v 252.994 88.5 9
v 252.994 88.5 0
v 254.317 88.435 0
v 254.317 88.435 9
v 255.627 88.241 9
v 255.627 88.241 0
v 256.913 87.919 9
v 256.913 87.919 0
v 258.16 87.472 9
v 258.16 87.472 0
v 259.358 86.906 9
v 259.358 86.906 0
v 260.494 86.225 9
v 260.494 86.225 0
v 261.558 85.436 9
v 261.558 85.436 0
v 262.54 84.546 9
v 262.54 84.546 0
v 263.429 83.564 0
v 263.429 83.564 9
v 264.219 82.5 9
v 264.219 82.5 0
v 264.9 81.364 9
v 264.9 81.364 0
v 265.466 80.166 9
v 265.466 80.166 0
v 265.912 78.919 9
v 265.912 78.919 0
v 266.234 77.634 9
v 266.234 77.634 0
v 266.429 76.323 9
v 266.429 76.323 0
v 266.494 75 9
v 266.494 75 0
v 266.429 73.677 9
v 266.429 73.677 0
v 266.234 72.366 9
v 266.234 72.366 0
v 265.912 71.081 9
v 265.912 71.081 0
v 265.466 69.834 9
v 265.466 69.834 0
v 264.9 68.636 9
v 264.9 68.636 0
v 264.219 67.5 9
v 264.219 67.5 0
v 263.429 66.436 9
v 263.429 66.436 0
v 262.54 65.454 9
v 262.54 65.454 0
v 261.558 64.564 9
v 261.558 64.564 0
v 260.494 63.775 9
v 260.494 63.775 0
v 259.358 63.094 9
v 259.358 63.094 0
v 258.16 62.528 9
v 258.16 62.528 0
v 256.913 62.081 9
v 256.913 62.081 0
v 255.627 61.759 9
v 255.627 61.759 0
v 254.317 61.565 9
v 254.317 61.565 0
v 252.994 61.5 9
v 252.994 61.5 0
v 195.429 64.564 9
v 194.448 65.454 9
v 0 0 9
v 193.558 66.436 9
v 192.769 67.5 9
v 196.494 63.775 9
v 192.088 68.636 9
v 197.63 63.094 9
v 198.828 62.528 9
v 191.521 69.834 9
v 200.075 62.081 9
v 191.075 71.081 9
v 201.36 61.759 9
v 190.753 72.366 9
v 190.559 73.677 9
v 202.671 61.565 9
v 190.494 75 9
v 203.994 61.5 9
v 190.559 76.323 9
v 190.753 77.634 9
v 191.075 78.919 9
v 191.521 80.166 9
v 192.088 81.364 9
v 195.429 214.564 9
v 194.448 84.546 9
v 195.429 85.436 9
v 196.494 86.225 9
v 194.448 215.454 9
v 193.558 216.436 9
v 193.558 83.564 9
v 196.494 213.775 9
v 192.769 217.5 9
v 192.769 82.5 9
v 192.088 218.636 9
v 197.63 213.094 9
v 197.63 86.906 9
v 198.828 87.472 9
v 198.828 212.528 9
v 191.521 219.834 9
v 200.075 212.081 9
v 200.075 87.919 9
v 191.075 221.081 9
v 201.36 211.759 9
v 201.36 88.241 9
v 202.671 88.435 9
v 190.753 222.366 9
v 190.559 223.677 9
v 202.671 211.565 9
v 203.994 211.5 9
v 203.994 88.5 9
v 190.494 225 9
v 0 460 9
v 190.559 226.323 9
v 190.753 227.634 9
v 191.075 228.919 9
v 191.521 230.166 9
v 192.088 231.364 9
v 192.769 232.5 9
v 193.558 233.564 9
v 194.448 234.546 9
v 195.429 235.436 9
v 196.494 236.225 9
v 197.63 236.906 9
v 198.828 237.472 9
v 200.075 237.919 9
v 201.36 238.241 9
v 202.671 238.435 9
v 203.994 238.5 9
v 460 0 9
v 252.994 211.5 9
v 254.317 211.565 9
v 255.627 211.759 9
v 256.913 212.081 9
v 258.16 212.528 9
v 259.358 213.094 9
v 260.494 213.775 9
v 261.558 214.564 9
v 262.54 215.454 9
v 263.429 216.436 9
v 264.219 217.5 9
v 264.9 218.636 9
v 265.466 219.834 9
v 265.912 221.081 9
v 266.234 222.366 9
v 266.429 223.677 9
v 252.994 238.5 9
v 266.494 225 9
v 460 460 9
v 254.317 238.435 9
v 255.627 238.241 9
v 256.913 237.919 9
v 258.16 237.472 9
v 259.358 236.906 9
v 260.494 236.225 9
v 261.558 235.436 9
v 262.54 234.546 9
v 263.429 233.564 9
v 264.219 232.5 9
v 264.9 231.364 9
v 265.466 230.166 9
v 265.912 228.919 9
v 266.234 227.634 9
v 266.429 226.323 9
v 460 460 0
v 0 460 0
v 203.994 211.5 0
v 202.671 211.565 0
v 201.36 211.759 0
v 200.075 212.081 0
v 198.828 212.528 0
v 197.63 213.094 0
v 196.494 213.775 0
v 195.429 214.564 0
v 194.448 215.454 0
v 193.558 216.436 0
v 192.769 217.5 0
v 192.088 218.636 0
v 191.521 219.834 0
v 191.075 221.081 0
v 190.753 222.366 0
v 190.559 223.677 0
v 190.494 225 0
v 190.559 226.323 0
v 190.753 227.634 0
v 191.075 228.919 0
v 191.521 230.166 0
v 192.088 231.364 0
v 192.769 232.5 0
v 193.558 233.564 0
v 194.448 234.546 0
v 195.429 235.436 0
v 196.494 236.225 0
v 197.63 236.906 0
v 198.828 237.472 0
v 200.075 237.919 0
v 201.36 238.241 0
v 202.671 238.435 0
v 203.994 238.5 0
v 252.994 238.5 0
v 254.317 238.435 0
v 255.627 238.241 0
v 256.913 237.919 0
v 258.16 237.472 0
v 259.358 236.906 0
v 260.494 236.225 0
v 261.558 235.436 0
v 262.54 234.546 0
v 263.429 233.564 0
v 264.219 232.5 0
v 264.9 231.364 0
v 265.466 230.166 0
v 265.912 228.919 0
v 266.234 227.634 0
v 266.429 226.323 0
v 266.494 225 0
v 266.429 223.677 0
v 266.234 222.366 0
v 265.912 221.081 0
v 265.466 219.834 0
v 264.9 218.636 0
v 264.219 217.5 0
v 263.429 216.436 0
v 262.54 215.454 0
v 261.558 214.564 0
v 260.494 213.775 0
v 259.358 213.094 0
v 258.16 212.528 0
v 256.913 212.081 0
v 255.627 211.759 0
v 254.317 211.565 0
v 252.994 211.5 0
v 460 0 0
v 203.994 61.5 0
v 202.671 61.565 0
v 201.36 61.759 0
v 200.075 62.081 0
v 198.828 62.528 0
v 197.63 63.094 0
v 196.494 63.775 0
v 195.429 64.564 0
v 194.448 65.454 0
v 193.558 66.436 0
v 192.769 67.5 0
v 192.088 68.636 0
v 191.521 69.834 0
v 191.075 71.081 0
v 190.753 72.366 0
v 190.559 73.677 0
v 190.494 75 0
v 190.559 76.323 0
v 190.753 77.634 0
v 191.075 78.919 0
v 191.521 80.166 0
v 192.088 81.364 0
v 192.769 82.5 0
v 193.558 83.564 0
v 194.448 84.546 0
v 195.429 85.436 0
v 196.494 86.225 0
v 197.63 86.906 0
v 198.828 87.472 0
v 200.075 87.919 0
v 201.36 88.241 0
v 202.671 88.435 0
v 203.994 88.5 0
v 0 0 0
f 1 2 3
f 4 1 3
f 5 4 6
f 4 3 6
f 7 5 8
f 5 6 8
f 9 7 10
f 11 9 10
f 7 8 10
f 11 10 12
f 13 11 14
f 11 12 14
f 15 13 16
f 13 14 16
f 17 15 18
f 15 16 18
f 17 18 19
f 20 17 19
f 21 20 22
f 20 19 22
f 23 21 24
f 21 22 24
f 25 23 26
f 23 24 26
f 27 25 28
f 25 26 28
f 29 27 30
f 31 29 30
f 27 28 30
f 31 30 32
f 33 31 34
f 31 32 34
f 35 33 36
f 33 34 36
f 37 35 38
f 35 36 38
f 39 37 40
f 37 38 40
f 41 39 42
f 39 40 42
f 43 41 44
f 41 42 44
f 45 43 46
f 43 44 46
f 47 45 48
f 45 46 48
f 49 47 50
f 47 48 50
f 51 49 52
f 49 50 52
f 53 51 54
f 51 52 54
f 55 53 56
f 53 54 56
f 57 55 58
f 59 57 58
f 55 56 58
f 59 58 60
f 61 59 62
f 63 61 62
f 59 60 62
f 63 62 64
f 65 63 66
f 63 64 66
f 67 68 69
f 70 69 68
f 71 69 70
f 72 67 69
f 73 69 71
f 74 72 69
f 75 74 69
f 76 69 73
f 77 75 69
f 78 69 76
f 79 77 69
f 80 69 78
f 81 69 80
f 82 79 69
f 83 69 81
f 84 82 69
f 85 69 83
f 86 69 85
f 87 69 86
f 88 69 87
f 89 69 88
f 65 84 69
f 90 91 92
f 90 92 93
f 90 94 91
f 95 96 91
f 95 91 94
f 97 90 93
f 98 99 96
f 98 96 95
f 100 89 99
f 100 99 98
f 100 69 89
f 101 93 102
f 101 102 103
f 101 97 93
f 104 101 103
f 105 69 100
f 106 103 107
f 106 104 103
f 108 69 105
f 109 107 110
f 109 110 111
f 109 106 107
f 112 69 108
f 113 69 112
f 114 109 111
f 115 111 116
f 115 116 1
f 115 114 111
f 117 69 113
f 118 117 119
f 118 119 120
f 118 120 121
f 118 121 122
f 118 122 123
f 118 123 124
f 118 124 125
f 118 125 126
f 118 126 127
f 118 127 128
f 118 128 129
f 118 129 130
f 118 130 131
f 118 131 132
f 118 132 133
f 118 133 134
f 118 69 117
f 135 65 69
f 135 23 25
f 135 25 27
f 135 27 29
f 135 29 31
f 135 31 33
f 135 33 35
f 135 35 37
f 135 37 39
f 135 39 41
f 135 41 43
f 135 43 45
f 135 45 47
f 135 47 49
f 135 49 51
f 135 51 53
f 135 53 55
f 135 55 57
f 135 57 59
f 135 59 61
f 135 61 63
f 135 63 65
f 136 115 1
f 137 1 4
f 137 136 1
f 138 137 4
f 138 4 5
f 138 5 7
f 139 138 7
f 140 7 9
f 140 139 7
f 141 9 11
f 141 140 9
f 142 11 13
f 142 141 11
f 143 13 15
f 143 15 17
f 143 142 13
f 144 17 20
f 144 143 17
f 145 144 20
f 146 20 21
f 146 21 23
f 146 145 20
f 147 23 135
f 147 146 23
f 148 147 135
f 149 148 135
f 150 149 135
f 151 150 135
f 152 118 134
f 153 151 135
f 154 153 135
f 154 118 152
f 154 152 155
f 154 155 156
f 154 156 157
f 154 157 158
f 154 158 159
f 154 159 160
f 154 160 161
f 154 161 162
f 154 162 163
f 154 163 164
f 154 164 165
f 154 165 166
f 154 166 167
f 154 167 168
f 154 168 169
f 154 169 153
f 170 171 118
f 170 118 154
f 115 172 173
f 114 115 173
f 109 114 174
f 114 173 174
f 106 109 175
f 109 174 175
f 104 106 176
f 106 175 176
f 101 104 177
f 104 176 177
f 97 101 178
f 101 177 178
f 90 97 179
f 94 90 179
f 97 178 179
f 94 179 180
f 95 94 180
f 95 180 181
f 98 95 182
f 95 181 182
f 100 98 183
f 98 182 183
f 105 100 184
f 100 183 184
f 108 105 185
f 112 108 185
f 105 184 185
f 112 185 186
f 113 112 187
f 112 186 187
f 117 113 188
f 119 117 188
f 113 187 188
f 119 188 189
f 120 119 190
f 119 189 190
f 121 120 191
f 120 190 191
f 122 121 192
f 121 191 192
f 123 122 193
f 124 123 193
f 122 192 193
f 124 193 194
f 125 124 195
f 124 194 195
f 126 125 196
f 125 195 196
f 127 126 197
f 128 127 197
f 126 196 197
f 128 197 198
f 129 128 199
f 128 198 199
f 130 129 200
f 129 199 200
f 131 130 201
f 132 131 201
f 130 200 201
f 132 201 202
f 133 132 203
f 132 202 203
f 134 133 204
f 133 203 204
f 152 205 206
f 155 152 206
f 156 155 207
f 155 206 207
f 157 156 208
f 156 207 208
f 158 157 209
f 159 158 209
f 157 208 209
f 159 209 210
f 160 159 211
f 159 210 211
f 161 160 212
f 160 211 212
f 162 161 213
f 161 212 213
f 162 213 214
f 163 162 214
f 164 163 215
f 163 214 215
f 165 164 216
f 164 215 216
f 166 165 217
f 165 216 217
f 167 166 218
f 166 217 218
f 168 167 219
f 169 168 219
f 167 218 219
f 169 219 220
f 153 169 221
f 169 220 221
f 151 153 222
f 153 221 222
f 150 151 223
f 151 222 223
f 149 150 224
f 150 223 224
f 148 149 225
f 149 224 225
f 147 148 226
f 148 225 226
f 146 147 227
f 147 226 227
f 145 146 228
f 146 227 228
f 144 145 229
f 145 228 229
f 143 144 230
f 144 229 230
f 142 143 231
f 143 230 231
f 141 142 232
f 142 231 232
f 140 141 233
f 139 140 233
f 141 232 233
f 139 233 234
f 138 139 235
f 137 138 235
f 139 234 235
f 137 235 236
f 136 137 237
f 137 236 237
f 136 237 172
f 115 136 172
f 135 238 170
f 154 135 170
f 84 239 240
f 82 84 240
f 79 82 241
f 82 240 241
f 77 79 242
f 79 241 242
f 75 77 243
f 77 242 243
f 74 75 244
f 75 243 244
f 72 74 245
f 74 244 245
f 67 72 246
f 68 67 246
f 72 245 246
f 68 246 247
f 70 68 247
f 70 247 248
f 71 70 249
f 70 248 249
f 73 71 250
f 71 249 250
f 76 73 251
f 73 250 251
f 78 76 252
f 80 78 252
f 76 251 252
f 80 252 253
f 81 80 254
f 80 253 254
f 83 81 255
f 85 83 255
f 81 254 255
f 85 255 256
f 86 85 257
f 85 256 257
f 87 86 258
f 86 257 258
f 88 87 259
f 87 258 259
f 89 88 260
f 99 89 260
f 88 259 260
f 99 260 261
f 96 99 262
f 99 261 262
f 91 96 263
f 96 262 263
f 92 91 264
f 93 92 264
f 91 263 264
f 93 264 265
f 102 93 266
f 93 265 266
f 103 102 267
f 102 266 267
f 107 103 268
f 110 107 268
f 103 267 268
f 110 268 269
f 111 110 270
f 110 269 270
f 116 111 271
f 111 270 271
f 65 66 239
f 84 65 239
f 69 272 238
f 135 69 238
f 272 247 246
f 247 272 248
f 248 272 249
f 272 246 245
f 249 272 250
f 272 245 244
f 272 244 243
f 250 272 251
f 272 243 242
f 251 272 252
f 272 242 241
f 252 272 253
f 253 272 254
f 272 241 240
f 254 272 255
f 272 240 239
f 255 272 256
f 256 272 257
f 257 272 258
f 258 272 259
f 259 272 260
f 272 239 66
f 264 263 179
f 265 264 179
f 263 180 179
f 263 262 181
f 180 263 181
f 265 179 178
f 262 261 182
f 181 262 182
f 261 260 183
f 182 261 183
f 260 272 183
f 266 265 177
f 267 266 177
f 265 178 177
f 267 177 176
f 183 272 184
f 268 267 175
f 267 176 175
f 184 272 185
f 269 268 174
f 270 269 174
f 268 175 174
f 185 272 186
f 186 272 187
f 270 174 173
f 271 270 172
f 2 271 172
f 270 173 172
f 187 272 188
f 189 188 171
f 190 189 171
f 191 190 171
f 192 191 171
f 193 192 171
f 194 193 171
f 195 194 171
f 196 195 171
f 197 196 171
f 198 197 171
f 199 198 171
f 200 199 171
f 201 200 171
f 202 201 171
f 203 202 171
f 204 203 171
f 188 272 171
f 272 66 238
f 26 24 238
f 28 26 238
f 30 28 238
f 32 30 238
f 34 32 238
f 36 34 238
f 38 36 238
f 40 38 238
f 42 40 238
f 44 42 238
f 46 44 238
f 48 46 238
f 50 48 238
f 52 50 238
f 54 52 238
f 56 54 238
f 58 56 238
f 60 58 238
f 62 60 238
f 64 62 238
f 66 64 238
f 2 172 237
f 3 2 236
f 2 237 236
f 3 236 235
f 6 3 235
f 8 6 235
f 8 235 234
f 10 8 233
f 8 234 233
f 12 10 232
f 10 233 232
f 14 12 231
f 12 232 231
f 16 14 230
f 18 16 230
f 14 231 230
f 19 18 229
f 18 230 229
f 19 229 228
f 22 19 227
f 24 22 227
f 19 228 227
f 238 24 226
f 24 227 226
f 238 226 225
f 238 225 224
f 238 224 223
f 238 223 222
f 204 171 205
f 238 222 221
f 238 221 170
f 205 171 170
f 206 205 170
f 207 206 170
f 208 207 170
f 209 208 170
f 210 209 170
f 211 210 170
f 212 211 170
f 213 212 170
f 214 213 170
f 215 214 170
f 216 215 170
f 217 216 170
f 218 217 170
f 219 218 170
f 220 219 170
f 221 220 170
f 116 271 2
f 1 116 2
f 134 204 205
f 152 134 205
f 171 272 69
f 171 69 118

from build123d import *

# Parameters (mm, degrees)
F0_W     = 460
F0_H     = 460
F1_DEPTH = 9


with BuildPart() as f1:
    # F0 (on Top) → F1 (new body)
    with BuildSketch(Plane.XY):
        with Locations((230, 230)):
            Rectangle(F0_W, F0_H)
        with BuildLine():
            Line((252.99375, 61.5), (203.99375, 61.5))
            ThreePointArc((203.99375, 61.5), (190.49375, 75), (203.99375, 88.5))
            Line((203.99375, 88.5), (252.99375, 88.5))
            ThreePointArc((252.99375, 88.5), (266.49375, 75), (252.99375, 61.5))
        make_face(mode=Mode.SUBTRACT)
        with BuildLine():
            ThreePointArc((252.99375, 238.5), (266.49375, 225), (252.99375, 211.5))
            Line((252.99375, 211.5), (203.99375, 211.5))
            ThreePointArc((203.99375, 211.5), (190.49375, 225), (203.99375, 238.5))
            Line((203.99375, 238.5), (252.99375, 238.5))
        make_face(mode=Mode.SUBTRACT)
    extrude(amount=F1_DEPTH)


solid = f1.part
